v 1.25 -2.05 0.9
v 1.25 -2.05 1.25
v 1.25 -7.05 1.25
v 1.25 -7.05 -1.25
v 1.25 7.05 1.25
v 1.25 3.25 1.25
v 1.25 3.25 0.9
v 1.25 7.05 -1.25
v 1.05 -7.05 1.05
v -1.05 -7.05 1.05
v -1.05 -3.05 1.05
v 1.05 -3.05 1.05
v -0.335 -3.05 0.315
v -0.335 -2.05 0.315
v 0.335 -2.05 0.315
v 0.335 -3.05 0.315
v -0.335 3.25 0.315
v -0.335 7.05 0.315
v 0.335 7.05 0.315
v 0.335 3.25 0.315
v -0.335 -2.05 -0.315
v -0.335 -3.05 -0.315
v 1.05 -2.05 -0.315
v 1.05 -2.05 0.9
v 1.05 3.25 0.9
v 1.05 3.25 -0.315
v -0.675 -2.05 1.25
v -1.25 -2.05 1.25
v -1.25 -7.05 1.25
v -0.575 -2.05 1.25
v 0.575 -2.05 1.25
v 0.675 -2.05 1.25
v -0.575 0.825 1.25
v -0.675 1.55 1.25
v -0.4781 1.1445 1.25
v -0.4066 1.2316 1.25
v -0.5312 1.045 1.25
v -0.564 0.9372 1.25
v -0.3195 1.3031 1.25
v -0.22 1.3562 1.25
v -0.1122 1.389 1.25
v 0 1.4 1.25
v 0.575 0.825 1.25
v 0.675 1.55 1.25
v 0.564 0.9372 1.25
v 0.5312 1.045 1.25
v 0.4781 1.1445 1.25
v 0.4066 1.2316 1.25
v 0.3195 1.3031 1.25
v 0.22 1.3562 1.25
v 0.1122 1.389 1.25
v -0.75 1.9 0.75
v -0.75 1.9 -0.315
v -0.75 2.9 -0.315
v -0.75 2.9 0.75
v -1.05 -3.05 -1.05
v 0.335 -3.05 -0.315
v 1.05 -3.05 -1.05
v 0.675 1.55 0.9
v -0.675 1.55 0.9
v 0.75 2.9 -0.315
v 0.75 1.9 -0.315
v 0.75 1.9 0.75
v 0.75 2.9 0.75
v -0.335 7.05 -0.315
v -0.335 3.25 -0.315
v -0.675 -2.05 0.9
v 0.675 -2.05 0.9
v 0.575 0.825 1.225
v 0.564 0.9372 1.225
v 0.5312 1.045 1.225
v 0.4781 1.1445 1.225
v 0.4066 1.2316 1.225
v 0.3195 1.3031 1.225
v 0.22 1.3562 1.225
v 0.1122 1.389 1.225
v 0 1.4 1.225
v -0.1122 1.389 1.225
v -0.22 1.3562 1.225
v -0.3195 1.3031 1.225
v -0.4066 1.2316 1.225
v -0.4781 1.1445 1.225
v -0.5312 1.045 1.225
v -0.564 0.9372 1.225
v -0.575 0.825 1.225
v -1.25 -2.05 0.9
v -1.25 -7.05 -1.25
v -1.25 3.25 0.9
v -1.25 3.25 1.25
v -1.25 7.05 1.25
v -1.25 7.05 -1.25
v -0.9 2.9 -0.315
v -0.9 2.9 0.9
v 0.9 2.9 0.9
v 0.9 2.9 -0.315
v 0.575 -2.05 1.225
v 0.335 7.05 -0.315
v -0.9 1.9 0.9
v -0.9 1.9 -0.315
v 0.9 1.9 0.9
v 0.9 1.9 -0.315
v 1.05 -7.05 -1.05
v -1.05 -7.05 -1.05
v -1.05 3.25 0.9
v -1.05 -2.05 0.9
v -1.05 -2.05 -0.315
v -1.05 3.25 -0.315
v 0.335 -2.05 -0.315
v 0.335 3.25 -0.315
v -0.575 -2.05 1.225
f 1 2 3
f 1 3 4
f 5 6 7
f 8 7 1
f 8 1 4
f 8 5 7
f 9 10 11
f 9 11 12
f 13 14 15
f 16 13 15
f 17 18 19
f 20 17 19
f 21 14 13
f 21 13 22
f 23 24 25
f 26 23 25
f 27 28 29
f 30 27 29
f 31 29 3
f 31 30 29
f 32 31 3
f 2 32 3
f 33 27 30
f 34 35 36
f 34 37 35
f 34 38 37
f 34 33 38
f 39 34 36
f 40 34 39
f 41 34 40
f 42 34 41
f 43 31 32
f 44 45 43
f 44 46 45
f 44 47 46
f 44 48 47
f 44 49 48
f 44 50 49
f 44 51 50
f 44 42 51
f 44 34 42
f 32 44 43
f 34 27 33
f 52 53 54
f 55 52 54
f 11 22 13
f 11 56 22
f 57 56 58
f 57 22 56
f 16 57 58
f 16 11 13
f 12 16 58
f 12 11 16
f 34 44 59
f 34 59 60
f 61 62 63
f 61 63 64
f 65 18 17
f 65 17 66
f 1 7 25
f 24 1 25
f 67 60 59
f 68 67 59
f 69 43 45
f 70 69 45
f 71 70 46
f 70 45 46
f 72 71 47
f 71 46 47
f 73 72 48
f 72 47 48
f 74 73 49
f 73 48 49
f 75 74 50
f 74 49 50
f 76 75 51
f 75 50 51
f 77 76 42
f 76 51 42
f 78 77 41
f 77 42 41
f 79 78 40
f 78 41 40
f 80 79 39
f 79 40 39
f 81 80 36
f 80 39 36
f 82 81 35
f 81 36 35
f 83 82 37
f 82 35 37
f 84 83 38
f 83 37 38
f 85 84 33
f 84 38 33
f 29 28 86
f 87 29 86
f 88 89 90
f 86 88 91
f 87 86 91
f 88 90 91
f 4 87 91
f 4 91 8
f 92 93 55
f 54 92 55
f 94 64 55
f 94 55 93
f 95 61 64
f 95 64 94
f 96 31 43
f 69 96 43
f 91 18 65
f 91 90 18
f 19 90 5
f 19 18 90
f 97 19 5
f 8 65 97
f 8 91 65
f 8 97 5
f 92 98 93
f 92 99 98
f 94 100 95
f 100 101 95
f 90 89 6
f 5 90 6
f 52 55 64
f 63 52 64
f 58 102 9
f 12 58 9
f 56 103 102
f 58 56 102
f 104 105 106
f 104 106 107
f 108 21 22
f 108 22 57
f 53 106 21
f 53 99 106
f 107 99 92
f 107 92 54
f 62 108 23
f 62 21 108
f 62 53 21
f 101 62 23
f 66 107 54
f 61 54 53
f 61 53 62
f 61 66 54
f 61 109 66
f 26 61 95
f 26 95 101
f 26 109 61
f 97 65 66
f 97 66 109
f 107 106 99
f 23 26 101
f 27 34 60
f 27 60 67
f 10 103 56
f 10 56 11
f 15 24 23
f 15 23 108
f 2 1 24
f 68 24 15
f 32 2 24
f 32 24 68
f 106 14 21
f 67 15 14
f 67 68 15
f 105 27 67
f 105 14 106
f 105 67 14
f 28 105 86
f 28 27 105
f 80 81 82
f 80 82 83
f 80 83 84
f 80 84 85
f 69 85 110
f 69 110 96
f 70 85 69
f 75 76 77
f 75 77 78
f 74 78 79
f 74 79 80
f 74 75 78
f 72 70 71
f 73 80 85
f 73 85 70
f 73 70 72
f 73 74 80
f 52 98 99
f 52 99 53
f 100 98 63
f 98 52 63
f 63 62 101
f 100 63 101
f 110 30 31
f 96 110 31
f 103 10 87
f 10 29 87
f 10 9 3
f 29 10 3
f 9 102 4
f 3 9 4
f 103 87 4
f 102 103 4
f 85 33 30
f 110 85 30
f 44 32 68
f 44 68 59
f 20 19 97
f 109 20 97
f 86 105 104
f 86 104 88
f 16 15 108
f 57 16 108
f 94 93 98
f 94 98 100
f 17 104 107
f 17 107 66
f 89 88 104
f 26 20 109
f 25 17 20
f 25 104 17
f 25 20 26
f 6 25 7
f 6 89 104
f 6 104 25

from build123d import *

# Parameters (mm, degrees)
SKETCH2_W           = 2.5
SKETCH2_H           = 2.5
BOSS_EXTRUDE1_DEPTH = 7.05
PINHOLE_REACH       = 16.1
SKETCH3_W           = 0.67
SKETCH3_H           = 0.63
CUT_EXTRUDE2_DEPTH  = 0.35
SKETCH5_W           = 2.1
SKETCH5_H           = 5.3
CUT_EXTRUDE3_DEPTH  = 1.215
CUT_EXTRUDE5_DEPTH  = 0.025
SKETCH7_W           = 2.1
SKETCH7_H           = 2.1
CUT_EXTRUDE6_DEPTH  = 4
SKETCH9_W           = 0.15
SKETCH9_H           = 1
HOLDER_1_DEPTH      = 1.065
SKETCH10_W          = 1.8
SKETCH10_H          = 1
HOLDER_2_DEPTH      = 0.15


with BuildPart() as part:
    # Sketch2 → Boss-Extrude1 (new body, symmetric)
    with BuildSketch(Plane(origin=(0, 0, 0), x_dir=(1, 0, 0), z_dir=(0, 1, 0))):
        Rectangle(SKETCH2_W, SKETCH2_H)
    extrude(amount=BOSS_EXTRUDE1_DEPTH, both=True)

    # Sketch3 → Pinhole (cut, up to next)
    with BuildSketch(Plane(origin=(0, 7.05, 0), x_dir=(1, 0, 0), z_dir=(0, 1, 0)), mode=Mode.PRIVATE) as pinhole_sk1:
        Rectangle(SKETCH3_W, SKETCH3_H)
    pinhole_tool1 = extrude(pinhole_sk1.sketch, amount=-PINHOLE_REACH, mode=Mode.PRIVATE) & part.part
    add(pinhole_tool1.solids().sort_by_distance((0, 7.05, 0))[0], mode=Mode.SUBTRACT)

    # Sketch4 → Cut-Extrude2 (cut)
    with BuildSketch(Plane.XY.offset(1.25)):
        Polygon((-1.25, 3.25), (1.25, 3.25), (1.25, -2.05), (0.675, -2.05), (0.675, 1.55), (-0.675, 1.55), (-0.675, -2.05), (-1.25, -2.05), align=None)
    extrude(amount=-CUT_EXTRUDE2_DEPTH, mode=Mode.SUBTRACT)

    # Sketch5 → Cut-Extrude3 (cut)
    with BuildSketch(Plane.XY.offset(0.9)):
        with Locations((0, 0.6)):
            Rectangle(SKETCH5_W, SKETCH5_H)
    extrude(amount=-CUT_EXTRUDE3_DEPTH, mode=Mode.SUBTRACT)

    # Sketch6 → Cut-Extrude5 (cut)
    with BuildSketch(Plane.XY.offset(1.25)):
        with BuildLine():
            Line((-0.575, 0.825), (-0.575, -2.05))
            Line((-0.575, -2.05), (0.575, -2.05))
            Line((0.575, -2.05), (0.575, 0.825))
            ThreePointArc((0.575, 0.825), (0, 1.4), (-0.575, 0.825))
        make_face()
    extrude(amount=-CUT_EXTRUDE5_DEPTH, mode=Mode.SUBTRACT)

    # Sketch7 → Cut-Extrude6 (cut)
    with BuildSketch(Plane.XZ.offset(7.05)):
        Rectangle(SKETCH7_W, SKETCH7_H)
    extrude(amount=-CUT_EXTRUDE6_DEPTH, mode=Mode.SUBTRACT)

    # Sketch9 → Holder-1 (add)
    with BuildSketch(Plane.XY.offset(-0.315)):
        with Locations((-0.825, 2.4)):
            Rectangle(SKETCH9_W, SKETCH9_H)
        with Locations((0.825, 2.4)):
            Rectangle(SKETCH9_W, SKETCH9_H)
    extrude(amount=HOLDER_1_DEPTH)

    # Sketch10 → Holder-2 (add)
    with BuildSketch(Plane.XY.offset(0.75)):
        with Locations((0, 2.4)):
            Rectangle(SKETCH10_W, SKETCH10_H)
    extrude(amount=HOLDER_2_DEPTH)


solid = part.part
